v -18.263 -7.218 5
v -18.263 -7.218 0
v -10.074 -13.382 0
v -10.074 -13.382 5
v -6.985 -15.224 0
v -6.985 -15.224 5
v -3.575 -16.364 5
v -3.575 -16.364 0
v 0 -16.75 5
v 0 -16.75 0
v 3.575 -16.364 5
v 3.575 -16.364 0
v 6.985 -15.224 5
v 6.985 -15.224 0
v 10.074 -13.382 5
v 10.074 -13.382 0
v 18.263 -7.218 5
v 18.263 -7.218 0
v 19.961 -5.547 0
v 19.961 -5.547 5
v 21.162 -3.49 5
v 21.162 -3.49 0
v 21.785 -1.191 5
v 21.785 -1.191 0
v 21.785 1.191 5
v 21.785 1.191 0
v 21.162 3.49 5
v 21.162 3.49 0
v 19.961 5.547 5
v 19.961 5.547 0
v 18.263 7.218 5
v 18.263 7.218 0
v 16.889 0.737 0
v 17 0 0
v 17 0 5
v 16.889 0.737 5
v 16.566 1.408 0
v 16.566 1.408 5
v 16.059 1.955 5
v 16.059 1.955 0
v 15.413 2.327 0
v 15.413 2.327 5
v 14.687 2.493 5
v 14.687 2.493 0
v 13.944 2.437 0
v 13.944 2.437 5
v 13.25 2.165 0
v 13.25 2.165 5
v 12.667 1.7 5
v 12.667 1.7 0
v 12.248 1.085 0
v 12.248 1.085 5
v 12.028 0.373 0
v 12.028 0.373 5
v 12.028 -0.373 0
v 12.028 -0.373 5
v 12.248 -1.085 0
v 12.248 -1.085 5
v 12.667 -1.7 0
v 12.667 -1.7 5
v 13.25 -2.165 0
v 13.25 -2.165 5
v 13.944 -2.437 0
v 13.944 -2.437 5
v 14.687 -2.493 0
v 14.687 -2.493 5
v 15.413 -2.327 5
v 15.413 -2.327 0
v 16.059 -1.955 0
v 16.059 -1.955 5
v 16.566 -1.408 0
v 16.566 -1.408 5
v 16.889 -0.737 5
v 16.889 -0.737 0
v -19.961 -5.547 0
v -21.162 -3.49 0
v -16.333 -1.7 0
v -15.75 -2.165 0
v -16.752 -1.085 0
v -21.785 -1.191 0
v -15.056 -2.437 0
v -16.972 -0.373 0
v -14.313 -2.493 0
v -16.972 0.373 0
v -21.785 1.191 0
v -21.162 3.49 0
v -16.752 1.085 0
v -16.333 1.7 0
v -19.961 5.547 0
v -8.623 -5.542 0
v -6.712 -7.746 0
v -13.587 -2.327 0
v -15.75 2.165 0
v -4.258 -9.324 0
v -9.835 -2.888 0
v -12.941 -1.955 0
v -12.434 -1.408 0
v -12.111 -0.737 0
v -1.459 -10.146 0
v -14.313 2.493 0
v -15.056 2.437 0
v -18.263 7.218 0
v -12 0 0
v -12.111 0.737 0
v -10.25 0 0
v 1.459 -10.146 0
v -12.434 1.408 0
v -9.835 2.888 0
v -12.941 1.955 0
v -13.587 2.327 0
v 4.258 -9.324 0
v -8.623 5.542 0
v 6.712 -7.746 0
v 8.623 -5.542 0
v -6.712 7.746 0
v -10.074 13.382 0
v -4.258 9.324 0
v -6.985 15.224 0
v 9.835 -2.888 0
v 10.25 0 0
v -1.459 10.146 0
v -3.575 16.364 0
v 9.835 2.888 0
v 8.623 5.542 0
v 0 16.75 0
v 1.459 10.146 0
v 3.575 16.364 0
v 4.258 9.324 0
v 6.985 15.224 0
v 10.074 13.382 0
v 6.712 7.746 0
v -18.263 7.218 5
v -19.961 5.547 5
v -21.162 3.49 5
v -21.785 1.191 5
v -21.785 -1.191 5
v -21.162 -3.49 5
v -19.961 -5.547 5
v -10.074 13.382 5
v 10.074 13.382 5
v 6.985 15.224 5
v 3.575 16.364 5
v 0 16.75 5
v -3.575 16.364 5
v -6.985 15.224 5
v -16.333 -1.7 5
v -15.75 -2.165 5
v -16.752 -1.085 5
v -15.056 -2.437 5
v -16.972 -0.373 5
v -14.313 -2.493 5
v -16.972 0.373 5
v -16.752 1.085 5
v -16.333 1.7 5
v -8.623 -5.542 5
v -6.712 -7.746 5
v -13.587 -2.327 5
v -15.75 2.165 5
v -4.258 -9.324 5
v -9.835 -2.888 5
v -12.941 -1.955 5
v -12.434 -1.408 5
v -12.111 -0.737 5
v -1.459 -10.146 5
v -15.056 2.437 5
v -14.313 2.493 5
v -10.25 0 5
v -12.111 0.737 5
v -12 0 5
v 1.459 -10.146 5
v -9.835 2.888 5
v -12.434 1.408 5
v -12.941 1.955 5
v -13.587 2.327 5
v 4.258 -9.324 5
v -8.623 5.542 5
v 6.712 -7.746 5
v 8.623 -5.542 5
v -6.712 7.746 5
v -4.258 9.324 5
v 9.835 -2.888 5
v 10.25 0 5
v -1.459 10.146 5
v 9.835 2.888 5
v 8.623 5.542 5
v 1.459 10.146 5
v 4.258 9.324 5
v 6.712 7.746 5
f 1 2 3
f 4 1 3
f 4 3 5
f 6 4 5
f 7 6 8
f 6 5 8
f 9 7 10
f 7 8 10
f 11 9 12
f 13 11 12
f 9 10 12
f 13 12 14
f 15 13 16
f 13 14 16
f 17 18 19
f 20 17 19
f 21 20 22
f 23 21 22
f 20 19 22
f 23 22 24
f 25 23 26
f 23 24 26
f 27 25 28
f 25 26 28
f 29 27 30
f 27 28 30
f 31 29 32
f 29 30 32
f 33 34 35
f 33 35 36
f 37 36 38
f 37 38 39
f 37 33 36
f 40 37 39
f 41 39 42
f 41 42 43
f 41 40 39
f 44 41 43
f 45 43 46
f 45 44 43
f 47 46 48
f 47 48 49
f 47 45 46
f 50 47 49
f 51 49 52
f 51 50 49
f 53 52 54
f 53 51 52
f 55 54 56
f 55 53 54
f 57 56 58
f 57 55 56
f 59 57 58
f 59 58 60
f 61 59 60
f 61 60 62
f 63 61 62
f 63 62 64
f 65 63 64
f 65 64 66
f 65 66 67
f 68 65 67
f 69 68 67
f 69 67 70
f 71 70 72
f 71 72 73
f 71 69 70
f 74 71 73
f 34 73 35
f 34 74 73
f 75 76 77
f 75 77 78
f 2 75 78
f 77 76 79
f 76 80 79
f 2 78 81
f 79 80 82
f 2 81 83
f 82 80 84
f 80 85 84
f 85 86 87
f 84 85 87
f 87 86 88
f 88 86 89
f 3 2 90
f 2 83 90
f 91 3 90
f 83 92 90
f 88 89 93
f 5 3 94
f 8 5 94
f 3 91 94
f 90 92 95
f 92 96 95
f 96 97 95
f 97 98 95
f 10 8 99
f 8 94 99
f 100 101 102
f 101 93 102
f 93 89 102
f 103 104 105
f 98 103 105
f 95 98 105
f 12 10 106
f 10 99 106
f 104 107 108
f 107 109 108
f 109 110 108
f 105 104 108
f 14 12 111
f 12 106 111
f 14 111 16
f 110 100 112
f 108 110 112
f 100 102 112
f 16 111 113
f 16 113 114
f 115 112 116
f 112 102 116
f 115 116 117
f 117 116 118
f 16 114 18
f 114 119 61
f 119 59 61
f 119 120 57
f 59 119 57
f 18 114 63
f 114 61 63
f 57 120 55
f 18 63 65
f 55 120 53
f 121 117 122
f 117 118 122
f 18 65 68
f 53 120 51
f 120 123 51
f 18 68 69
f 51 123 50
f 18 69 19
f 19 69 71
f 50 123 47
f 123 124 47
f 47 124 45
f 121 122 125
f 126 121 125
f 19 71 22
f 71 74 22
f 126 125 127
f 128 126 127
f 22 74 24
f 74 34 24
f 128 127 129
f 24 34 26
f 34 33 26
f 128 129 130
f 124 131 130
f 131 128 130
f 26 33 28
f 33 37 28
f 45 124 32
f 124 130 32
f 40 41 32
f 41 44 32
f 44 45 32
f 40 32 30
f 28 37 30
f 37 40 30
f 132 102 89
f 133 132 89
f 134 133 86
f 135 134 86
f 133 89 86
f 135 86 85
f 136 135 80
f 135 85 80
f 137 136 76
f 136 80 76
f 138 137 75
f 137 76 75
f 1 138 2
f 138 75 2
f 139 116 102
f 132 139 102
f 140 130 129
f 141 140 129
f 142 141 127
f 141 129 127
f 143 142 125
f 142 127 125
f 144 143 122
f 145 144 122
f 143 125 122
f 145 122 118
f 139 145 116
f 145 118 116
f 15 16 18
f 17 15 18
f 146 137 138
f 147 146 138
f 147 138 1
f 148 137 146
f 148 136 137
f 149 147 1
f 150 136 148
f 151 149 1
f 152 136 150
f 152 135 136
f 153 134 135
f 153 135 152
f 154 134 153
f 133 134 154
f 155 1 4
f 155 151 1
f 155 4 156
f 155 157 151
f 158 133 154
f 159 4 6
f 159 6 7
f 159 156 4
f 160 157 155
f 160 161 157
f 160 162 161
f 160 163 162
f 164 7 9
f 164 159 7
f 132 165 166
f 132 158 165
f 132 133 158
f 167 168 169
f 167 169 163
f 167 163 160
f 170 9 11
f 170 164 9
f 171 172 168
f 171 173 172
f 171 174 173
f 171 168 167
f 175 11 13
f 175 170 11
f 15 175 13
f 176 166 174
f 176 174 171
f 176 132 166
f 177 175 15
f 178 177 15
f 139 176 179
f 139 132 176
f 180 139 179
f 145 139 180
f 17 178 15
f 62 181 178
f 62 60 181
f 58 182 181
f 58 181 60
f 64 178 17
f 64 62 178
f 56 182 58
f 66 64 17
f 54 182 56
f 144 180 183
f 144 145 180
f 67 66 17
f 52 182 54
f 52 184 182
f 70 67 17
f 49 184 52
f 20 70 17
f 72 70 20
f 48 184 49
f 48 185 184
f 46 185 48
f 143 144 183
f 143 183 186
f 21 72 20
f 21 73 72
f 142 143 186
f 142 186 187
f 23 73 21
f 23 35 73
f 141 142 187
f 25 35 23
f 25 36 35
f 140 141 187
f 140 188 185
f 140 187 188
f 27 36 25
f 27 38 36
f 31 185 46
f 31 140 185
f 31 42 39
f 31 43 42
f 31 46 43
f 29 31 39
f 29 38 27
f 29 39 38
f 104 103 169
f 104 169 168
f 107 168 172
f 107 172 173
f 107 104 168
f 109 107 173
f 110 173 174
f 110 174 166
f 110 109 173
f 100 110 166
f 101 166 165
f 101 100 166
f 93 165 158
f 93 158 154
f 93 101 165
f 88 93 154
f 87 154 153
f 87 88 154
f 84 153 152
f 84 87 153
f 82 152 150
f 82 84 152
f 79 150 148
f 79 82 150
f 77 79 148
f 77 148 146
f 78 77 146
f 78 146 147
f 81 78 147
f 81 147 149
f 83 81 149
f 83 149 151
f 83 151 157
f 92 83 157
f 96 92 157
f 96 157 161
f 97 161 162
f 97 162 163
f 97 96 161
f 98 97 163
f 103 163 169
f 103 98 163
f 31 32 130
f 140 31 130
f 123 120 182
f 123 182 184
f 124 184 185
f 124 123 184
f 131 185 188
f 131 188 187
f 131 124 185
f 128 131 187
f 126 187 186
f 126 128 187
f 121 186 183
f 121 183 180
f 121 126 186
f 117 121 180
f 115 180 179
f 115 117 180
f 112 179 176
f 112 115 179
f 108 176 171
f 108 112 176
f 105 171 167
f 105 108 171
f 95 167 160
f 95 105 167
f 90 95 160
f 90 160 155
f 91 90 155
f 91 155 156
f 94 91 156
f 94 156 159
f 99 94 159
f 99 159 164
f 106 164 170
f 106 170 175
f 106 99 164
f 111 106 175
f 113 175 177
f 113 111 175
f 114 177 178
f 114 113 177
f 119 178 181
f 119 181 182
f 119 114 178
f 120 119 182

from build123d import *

# Parameters (mm, degrees)
SKETCH1_R           = 2.5
SKETCH1_R_2         = 10.25
BOSS_EXTRUDE1_DEPTH = 5


with BuildPart() as part:
    # Sketch1 → Boss-Extrude1 (new body)
    with BuildSketch(Plane.XY):
        with BuildLine():
            Line((-18.262940366, -7.217732658), (-10.073546599, -13.382307683))
            ThreePointArc((-10.073546599, -13.382307683), (0, -16.75), (10.073546599, -13.382307683))
            Line((10.073546599, -13.382307683), (18.262940366, -7.217732658))
            ThreePointArc((18.262940366, -7.217732658), (21.863878029, 0), (18.262940366, 7.217732658))
            Line((18.262940366, 7.217732658), (10.073546599, 13.382307683))
            ThreePointArc((10.073546599, 13.382307683), (0, 16.75), (-10.073546599, 13.382307683))
            Line((-10.073546599, 13.382307683), (-18.262940366, 7.217732658))
            ThreePointArc((-18.262940366, 7.217732658), (-21.863878029, 0), (-18.262940366, -7.217732658))
        make_face()
        with Locations((14.5, 0)):
            Circle(SKETCH1_R, mode=Mode.SUBTRACT)
        with Locations((-14.5, 0)):
            Circle(SKETCH1_R, mode=Mode.SUBTRACT)
        Circle(SKETCH1_R_2, mode=Mode.SUBTRACT)
    extrude(amount=BOSS_EXTRUDE1_DEPTH)


solid = part.part
